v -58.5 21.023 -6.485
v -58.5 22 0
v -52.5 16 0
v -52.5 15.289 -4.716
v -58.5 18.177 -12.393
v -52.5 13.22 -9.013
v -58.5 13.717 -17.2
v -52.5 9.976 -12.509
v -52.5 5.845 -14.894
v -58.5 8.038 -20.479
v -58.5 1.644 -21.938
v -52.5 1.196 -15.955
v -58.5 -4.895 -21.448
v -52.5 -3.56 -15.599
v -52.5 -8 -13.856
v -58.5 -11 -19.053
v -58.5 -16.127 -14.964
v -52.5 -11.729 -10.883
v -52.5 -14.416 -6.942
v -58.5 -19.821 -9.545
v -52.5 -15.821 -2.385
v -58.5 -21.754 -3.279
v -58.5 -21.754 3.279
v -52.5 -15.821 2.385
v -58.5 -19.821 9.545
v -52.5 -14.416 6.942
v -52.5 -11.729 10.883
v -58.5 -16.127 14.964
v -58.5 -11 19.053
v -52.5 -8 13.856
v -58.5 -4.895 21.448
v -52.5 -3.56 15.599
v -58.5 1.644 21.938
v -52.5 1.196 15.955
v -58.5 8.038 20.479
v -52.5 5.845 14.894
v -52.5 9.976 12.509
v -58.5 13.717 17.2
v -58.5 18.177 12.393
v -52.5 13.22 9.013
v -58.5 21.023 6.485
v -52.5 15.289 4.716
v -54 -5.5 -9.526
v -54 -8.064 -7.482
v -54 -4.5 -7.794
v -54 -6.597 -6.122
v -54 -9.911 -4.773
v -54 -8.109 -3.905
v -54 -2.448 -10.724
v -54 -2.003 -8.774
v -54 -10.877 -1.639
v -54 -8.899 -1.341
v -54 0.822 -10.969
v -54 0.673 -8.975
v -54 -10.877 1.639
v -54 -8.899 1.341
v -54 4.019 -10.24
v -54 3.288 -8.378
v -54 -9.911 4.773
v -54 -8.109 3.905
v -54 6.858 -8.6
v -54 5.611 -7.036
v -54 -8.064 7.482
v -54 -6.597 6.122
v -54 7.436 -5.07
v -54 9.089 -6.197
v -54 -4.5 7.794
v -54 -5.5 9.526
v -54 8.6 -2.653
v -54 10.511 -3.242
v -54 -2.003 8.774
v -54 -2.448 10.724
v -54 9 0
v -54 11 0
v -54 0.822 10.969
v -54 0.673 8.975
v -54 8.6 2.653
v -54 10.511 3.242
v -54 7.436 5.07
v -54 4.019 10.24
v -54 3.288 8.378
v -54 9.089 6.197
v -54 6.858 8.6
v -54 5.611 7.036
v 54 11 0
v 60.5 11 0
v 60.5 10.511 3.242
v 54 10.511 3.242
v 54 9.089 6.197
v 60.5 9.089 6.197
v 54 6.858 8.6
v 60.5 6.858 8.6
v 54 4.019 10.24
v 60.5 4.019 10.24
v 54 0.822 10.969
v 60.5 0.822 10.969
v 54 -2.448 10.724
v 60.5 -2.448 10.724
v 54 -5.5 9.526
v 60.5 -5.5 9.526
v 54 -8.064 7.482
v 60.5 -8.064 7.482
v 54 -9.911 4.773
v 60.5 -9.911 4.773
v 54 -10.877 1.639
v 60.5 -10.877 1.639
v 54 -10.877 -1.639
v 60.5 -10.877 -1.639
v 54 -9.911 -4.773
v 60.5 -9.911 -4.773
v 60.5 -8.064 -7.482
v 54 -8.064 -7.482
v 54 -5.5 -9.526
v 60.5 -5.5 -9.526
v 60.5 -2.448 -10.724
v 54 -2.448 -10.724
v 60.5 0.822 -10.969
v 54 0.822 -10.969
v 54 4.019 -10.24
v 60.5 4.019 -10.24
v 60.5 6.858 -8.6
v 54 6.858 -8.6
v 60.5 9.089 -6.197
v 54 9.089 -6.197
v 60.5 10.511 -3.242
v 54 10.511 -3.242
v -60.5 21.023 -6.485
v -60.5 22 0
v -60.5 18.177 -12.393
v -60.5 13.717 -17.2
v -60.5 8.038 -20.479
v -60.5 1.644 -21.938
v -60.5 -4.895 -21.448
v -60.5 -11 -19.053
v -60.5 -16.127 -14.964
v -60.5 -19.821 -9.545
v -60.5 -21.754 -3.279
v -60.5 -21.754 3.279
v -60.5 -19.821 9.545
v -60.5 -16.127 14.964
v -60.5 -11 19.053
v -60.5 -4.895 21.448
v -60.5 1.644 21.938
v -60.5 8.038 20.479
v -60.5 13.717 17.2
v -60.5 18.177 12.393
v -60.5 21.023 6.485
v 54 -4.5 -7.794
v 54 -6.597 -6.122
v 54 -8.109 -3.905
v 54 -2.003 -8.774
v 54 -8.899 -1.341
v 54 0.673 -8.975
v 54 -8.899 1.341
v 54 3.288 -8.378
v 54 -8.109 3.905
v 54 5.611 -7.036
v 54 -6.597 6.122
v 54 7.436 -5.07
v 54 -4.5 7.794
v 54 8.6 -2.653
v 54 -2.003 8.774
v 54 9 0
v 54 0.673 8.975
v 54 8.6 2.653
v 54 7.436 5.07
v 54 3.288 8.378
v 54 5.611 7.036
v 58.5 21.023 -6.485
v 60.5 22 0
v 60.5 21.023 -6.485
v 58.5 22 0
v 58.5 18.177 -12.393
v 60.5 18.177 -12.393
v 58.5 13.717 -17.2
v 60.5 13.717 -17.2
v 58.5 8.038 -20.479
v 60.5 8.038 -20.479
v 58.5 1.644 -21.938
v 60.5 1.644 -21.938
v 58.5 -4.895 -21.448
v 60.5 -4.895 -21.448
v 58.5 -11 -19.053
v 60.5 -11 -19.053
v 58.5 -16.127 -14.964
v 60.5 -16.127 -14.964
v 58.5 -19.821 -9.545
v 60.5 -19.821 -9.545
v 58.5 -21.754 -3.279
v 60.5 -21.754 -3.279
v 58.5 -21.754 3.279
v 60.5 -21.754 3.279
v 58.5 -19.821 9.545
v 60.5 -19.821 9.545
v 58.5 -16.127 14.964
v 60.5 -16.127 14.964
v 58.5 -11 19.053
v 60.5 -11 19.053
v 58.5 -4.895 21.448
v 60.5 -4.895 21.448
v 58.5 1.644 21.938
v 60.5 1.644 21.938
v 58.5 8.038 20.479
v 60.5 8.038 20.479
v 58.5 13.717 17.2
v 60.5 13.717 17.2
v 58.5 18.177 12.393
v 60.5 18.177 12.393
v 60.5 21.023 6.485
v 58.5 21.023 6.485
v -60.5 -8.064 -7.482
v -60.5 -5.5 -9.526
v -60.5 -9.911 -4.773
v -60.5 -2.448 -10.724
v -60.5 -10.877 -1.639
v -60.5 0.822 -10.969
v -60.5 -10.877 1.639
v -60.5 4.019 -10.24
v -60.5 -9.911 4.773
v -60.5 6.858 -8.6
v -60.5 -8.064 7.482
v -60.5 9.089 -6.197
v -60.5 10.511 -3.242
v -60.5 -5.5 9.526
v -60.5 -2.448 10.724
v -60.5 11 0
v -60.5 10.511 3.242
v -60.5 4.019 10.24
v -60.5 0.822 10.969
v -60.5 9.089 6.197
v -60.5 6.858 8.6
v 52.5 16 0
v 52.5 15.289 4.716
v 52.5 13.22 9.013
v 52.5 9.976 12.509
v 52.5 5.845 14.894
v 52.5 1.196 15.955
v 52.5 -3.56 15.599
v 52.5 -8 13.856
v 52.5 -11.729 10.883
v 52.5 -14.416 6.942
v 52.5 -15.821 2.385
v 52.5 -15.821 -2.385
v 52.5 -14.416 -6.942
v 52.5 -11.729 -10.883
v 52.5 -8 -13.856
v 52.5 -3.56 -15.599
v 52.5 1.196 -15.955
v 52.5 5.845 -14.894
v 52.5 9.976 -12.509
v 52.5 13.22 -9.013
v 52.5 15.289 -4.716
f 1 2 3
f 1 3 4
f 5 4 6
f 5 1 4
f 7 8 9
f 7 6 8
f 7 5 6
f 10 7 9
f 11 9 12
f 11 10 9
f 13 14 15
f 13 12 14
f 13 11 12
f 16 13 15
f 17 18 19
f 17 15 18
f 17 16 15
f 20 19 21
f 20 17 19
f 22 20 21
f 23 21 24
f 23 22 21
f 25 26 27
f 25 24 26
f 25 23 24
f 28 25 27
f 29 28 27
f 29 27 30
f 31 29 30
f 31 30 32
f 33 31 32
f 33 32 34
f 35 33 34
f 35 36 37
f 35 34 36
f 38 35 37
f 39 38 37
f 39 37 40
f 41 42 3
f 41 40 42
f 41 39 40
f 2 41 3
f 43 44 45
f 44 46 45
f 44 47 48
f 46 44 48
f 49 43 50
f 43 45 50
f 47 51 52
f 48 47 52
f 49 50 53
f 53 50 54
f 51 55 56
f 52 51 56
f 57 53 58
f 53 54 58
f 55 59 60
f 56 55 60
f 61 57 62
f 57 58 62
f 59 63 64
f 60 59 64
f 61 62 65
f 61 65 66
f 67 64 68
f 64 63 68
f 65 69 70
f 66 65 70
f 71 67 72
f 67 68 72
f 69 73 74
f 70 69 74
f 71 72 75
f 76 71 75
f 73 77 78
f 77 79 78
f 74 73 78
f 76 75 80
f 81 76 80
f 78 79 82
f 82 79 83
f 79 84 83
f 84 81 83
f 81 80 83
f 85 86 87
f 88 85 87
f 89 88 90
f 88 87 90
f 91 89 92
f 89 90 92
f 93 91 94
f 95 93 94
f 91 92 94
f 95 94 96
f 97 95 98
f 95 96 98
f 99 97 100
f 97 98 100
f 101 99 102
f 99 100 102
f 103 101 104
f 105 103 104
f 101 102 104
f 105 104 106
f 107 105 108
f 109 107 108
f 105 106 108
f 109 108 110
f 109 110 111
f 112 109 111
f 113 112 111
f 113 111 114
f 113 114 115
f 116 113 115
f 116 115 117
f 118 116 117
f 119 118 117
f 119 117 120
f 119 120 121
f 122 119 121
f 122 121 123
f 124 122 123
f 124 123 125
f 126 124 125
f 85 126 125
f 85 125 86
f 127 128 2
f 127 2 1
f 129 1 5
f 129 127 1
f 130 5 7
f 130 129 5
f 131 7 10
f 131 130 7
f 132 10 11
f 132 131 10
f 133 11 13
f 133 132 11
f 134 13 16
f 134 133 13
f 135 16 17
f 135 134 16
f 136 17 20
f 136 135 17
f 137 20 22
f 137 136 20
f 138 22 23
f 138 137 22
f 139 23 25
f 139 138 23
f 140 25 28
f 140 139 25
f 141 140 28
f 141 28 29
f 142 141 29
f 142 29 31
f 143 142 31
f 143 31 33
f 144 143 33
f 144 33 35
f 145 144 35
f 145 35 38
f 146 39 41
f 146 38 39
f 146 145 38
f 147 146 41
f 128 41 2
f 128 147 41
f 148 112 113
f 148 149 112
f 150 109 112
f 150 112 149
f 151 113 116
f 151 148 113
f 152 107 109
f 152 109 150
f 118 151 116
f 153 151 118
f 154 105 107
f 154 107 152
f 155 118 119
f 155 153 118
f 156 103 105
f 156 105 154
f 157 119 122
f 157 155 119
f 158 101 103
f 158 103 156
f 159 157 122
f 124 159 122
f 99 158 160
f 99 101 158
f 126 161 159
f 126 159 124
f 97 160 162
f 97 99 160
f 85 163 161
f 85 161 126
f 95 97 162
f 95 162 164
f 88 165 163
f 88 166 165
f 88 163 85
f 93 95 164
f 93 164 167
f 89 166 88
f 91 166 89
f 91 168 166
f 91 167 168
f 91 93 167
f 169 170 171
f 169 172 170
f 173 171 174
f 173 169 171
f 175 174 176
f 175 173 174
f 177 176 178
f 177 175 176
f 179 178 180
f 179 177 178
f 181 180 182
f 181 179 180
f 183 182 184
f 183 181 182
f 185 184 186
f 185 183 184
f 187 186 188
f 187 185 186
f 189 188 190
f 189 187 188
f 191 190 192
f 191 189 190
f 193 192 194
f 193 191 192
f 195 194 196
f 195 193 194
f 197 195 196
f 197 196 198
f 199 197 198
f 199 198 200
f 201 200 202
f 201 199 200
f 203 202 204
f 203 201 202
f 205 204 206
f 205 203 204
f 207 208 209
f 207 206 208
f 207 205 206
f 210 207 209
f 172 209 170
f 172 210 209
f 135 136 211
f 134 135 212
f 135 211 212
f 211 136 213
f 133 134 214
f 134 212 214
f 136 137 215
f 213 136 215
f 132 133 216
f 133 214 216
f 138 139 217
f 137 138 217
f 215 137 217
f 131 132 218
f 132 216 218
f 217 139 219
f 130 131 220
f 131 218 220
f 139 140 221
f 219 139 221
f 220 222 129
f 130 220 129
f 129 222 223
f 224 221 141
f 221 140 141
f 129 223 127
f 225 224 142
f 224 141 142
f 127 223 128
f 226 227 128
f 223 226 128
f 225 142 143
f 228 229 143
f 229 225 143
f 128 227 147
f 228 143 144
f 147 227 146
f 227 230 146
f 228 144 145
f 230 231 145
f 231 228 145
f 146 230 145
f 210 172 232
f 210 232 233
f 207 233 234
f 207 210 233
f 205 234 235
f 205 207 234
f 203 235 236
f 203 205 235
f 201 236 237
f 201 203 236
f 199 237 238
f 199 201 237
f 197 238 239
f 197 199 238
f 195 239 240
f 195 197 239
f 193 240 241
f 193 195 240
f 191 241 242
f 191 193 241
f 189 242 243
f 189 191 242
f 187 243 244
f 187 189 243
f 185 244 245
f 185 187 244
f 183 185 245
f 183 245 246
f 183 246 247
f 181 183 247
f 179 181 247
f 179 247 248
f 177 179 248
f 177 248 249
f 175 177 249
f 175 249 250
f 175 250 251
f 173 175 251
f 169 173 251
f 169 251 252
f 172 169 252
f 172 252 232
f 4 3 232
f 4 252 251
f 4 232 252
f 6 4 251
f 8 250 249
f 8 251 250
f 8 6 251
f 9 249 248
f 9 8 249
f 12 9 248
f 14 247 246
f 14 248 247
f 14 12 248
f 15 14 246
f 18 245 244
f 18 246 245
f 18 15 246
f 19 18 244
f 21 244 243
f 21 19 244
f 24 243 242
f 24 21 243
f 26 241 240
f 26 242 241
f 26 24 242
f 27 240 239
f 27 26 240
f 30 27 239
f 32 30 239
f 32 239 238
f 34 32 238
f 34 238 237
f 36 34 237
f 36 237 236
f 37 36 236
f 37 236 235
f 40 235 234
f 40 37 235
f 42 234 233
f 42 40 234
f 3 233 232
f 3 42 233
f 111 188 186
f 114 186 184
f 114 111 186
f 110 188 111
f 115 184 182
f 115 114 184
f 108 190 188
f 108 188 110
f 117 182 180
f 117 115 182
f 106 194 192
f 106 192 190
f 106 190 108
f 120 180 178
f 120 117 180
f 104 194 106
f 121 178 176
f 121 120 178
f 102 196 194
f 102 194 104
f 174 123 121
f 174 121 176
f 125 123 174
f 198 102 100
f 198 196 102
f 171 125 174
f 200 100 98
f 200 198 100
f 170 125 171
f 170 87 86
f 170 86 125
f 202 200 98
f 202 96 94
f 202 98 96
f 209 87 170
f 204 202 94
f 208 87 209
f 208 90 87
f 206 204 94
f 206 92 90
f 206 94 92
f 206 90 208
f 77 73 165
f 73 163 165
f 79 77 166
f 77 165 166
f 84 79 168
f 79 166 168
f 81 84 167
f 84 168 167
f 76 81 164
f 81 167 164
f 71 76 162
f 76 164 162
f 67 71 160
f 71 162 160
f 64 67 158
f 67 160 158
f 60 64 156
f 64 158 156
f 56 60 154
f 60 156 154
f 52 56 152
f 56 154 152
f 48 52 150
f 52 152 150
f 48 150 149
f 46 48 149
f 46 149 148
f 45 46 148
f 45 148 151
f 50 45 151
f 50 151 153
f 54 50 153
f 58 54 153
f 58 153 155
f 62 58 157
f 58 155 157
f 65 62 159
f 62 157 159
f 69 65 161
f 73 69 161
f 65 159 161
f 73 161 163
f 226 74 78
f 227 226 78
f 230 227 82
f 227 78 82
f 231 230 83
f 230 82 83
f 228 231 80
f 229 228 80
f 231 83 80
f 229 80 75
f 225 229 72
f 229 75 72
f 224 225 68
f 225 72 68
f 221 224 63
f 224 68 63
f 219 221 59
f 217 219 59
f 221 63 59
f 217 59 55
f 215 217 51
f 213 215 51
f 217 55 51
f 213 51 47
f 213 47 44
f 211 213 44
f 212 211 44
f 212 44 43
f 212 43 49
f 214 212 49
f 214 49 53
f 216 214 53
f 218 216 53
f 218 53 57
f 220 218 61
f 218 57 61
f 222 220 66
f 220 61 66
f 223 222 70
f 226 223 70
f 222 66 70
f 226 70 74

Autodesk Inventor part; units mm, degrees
ref_plane "YZ Plane" through (0, 0, 0) normal (1, 0, 0) x (0, 1, 0)
ref_plane "XZ Plane" through (0, 0, 0) normal (0, 1, 0) x (-1, 0, 0)
ref_plane "XY Plane" through (0, 0, 0) normal (0, 0, 1) x (1, 0, 0)
sketch "Sketch1" plane through (0, 0, 0) normal (0, 0, 1) x (1, 0, 0)
  line L0 (-60.5, 11) -> (-54, 11)
  line L1 (-54, 11) -> (-54, 9)
  line L2 (-54, 9) -> (54, 9)
  line L3 (54, 9) -> (54, 11)
  line L4 (54, 11) -> (60.5, 11)
  line L5 (60.5, 11) -> (60.5, 22)
  line L6 (60.5, 22) -> (58.5, 22)
  line L7 (58.5, 22) -> (52.5, 16)
  line L8 (52.5, 16) -> (-52.5, 16)
  line L9 (-52.5, 16) -> (-58.5, 22)
  line L10 (-58.5, 22) -> (-60.5, 22)
  line L11 (-60.5, 22) -> (-60.5, 11)
  line L12 (-84.7, 0) -> (84.7, 0) projected
  point P0 (0, 0)
  point P1 (0, 16)
  point P2 (0, 9)
  dimension "d0" = 11
  dimension "d1" = 6.5
  dimension "d2" = 9
  dimension "d4" = 105
  dimension "d6" = 2
  dimension "d7" = 16
  dimension "d8" = 22
revolve "Revolution1" add sketch "Sketch1" angle 360 about axis through (-10, 0, 0) along (1, 0, 0)
properties part number "Riiserolle"
